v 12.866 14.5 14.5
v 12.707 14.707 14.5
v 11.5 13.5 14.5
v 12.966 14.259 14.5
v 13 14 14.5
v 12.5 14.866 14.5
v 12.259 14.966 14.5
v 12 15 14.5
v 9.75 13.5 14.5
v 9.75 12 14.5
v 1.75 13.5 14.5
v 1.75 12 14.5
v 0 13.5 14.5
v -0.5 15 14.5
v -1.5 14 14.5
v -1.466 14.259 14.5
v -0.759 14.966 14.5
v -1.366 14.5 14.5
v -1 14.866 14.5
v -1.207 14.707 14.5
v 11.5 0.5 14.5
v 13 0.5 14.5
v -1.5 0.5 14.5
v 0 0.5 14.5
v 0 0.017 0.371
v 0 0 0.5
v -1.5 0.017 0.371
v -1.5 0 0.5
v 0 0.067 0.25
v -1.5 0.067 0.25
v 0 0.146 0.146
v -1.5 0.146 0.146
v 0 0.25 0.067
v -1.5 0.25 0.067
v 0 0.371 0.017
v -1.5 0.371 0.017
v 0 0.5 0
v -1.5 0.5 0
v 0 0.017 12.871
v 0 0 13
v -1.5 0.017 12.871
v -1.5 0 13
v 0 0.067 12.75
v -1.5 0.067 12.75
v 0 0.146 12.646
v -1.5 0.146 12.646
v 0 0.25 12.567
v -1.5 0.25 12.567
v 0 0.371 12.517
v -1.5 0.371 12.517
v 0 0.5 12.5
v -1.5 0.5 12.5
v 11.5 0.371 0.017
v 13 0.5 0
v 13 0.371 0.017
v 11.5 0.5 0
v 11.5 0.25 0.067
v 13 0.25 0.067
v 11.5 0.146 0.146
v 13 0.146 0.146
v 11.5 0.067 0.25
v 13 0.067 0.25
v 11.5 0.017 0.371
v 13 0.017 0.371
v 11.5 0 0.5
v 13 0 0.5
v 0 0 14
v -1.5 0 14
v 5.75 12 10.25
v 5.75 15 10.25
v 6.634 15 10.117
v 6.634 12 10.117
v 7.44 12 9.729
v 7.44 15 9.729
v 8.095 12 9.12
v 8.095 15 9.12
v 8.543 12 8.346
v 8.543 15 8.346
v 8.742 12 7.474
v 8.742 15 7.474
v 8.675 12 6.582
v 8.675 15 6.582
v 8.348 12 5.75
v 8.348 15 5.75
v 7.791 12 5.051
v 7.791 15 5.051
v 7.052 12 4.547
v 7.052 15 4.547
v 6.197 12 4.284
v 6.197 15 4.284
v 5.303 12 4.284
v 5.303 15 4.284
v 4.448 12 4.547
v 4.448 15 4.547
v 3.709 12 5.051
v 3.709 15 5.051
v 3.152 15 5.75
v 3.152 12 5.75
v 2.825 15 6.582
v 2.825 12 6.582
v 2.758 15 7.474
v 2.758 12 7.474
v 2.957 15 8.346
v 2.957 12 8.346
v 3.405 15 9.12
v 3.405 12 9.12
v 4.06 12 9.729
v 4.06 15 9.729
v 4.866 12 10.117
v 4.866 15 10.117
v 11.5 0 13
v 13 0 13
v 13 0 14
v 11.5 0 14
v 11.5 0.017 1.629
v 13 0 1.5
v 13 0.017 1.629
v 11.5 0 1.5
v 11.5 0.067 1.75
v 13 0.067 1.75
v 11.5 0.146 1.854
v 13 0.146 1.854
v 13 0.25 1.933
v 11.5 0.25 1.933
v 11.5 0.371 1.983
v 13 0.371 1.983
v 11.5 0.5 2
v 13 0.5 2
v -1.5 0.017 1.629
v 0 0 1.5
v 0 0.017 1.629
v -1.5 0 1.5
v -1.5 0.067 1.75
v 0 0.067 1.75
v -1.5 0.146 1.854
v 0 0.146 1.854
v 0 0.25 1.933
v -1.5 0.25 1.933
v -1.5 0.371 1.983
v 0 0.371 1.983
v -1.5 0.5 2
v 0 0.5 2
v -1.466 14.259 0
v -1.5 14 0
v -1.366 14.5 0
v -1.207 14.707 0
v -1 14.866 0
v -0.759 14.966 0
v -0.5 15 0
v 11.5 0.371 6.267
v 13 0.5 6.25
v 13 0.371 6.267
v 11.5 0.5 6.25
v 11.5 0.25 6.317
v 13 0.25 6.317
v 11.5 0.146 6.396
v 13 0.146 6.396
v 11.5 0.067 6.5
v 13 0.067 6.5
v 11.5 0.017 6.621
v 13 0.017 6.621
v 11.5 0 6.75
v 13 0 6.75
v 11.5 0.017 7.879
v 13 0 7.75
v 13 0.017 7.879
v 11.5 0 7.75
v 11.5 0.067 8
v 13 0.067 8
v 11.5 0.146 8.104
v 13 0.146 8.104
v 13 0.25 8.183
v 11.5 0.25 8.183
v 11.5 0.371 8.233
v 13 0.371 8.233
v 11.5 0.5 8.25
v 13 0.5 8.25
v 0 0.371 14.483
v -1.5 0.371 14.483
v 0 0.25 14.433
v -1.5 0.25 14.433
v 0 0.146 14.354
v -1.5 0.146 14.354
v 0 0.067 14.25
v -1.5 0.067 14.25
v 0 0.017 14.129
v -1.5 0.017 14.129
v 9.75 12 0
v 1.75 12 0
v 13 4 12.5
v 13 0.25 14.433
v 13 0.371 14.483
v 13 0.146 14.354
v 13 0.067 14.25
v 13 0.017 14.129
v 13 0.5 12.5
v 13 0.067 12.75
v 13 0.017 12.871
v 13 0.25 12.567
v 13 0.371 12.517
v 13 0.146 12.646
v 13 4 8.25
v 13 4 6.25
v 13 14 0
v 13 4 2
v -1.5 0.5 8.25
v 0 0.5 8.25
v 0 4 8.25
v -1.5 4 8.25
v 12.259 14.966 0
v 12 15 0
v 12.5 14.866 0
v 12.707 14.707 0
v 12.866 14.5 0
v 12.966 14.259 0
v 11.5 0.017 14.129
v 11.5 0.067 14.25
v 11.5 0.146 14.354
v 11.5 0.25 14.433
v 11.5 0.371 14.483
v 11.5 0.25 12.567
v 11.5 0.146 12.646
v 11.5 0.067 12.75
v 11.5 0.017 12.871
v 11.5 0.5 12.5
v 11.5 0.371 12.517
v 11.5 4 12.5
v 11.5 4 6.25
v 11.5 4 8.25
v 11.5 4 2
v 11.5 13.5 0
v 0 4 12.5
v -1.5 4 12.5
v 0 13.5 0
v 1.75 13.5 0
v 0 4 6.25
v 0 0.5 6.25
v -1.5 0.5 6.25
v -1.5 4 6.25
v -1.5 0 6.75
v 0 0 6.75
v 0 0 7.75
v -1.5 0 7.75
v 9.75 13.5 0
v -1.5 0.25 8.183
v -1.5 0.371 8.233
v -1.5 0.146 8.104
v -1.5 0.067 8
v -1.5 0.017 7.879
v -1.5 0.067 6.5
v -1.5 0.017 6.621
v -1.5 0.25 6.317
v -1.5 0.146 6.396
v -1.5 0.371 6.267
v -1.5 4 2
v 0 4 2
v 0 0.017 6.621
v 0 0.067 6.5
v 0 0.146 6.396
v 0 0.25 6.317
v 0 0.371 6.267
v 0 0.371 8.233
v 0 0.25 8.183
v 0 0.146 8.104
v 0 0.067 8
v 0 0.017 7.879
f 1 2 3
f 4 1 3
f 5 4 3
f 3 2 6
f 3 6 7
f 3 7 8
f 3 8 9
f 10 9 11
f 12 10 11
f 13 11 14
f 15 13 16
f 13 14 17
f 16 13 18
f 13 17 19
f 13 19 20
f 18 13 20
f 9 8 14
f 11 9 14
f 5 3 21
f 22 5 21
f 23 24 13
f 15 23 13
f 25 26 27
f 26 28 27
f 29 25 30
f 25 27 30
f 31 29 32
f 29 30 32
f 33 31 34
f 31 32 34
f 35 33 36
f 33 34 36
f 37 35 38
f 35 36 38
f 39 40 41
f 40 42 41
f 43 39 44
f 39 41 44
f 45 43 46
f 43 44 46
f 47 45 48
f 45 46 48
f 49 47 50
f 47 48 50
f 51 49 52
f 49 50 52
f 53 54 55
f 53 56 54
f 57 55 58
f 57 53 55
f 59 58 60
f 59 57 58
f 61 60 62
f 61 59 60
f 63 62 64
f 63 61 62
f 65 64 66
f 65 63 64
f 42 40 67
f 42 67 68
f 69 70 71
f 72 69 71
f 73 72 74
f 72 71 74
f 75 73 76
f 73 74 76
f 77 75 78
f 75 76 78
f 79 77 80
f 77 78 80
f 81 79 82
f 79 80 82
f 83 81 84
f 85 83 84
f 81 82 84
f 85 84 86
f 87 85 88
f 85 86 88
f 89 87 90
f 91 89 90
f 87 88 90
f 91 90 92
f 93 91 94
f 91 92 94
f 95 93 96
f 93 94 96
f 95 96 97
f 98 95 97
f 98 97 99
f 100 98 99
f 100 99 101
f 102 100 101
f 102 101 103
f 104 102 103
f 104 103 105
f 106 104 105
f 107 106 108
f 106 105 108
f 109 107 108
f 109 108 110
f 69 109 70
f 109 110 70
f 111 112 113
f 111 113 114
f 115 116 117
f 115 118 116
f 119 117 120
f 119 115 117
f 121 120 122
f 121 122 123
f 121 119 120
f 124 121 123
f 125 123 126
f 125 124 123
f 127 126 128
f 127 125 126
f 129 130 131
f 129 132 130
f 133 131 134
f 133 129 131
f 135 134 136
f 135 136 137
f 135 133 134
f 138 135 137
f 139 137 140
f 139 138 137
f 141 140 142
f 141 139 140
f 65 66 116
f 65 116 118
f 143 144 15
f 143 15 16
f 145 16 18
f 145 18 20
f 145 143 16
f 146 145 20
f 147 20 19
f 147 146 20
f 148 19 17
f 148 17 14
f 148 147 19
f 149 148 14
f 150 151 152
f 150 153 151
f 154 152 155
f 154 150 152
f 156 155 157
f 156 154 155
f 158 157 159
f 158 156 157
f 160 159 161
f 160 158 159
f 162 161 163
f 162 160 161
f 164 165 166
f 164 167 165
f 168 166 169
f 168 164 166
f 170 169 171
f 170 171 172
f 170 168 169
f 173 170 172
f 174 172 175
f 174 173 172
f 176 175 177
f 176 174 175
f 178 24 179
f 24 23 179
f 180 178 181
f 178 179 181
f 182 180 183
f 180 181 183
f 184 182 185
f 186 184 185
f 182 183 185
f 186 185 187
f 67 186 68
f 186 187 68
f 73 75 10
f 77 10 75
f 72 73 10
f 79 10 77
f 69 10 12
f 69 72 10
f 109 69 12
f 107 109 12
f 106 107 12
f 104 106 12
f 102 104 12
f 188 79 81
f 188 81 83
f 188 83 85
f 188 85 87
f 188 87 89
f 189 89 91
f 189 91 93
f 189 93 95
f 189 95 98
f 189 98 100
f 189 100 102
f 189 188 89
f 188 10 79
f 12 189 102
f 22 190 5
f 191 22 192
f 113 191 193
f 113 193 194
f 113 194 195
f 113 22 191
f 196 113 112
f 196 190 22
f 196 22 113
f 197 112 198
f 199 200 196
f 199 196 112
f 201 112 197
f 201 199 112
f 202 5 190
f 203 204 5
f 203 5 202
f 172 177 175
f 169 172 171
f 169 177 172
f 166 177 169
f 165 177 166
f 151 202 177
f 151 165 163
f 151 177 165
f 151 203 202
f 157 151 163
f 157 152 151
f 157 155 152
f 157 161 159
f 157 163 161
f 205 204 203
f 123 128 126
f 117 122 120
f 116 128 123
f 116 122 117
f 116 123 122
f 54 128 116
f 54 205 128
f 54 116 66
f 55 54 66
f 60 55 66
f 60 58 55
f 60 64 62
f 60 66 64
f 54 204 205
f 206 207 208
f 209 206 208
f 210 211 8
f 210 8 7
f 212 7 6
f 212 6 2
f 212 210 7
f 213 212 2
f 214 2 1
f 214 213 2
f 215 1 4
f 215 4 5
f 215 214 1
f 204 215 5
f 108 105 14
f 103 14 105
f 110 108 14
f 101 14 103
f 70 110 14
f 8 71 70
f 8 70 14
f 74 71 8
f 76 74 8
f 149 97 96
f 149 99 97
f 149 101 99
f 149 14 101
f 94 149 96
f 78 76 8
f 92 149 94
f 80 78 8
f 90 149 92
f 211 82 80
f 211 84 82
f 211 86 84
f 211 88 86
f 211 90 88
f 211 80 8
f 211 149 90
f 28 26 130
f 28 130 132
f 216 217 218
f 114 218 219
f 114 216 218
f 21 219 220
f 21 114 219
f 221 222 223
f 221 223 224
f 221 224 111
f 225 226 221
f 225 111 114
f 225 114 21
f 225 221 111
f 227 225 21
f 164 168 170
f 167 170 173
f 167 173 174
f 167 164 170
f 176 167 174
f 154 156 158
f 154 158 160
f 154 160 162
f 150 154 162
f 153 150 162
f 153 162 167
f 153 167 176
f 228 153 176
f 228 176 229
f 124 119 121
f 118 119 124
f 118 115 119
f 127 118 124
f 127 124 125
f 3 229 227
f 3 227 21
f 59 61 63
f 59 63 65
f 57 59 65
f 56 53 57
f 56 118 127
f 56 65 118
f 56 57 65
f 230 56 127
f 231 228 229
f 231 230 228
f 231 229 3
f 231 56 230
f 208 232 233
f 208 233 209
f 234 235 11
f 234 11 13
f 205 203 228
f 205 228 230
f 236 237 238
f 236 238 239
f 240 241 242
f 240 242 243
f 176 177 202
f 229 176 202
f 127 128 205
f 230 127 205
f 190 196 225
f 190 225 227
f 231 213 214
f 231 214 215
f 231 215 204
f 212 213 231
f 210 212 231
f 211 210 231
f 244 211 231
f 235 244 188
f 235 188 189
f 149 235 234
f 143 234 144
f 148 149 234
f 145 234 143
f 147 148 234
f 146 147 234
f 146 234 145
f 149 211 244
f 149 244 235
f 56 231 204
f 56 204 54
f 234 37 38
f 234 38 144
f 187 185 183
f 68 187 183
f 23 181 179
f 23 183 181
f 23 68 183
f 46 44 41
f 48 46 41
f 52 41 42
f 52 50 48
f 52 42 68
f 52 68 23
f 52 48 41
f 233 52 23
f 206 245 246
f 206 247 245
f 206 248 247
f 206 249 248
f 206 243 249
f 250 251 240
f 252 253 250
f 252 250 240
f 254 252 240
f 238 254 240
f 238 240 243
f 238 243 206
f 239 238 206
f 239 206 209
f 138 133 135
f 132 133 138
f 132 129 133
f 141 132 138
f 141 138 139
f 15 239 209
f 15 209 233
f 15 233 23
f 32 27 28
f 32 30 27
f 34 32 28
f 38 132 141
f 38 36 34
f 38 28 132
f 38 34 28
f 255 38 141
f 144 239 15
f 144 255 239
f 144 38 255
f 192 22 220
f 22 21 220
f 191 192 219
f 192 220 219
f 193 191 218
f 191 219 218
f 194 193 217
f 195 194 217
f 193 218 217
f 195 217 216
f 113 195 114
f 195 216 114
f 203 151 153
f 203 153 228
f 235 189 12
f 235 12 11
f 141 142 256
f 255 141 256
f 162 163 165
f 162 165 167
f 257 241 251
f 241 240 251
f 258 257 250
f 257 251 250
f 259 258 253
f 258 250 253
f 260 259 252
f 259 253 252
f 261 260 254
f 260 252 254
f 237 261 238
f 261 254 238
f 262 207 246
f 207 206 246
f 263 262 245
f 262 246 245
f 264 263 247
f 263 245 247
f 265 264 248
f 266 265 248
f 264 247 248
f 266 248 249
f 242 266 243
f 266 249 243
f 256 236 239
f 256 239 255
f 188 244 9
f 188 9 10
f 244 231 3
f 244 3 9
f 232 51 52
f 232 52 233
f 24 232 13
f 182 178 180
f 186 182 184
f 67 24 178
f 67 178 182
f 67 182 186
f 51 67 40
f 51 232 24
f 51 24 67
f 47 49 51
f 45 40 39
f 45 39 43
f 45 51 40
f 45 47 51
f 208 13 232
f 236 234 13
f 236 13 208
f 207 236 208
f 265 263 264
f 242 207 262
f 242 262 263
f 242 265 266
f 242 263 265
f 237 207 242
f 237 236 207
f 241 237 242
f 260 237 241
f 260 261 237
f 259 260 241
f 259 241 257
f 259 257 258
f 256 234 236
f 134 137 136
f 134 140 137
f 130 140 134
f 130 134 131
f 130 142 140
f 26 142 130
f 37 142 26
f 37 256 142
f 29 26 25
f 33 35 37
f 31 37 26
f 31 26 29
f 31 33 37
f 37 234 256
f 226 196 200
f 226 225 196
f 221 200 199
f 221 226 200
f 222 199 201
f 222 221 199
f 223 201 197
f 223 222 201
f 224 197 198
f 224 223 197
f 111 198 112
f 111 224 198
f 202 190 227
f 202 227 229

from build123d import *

# Parameters (mm, degrees)
BOSS_EXTRUDE1_DEPTH = 14.5
CUT_EXTRUDE1_REACH  = 27.407
SKETCH2_W           = 4.25
SKETCH2_H           = 4
FILLET1_R           = 0.5
SKETCH3_R           = 3
CUT_EXTRUDE2_DEPTH  = 3


with BuildPart() as part:
    # Sketch1 → Boss-Extrude1 (new body)
    with BuildSketch(Plane.XY):
        with BuildLine():
            Line((0, 0), (-1.5, 0))
            Line((-1.5, 0), (-1.5, 14))
            ThreePointArc((-1.5, 14), (-1.207106781, 14.707106781), (-0.5, 15))
            Line((-0.5, 15), (12, 15))
            ThreePointArc((12, 15), (12.707106781, 14.707106781), (13, 14))
            Line((13, 14), (13, 0))
            Line((13, 0), (11.5, 0))
            Line((11.5, 0), (11.5, 13.5))
            Line((11.5, 13.5), (9.75, 13.5))
            Line((9.75, 13.5), (9.75, 12))
            Line((9.75, 12), (1.75, 12))
            Line((1.75, 12), (1.75, 13.5))
            Line((1.75, 13.5), (0, 13.5))
            Line((0, 13.5), (0, 0))
        make_face()
    extrude(amount=BOSS_EXTRUDE1_DEPTH)

    # Cut-Extrude1: up to this face of the body (flat: up to its plane)
    cut_extrude1_end = Plane(part.part.faces().sort_by_distance((-1.5, 7, 7.25))[0])
    # Sketch2 → Cut-Extrude1 (cut, up to the picked face)
    with BuildSketch(Plane(origin=(13, 0, 0), x_dir=(0, 0, -1), z_dir=(1, 0, 0)), mode=Mode.PRIVATE) as cut_extrude1_sk1:
        with Locations((-10.375, 2)):
            Rectangle(SKETCH2_W, SKETCH2_H)
    cut_extrude1_tool1 = split(extrude(cut_extrude1_sk1.sketch, amount=-CUT_EXTRUDE1_REACH, mode=Mode.PRIVATE), bisect_by=cut_extrude1_end, keep=Keep.BOTH, mode=Mode.PRIVATE)
    # Sketch2 → Cut-Extrude1 (cut, up to the picked face)
    with BuildSketch(Plane(origin=(13, 0, 0), x_dir=(0, 0, -1), z_dir=(1, 0, 0)), mode=Mode.PRIVATE) as cut_extrude1_sk2:
        with Locations((-4.125, 2)):
            Rectangle(SKETCH2_W, SKETCH2_H)
    cut_extrude1_tool2 = split(extrude(cut_extrude1_sk2.sketch, amount=-CUT_EXTRUDE1_REACH, mode=Mode.PRIVATE), bisect_by=cut_extrude1_end, keep=Keep.BOTH, mode=Mode.PRIVATE)
    add(cut_extrude1_tool1.solids().sort_by(Axis((13, 2, 10.375), (-1, 0, 0)))[0], mode=Mode.SUBTRACT)
    add(cut_extrude1_tool2.solids().sort_by(Axis((13, 2, 4.125), (-1, 0, 0)))[0], mode=Mode.SUBTRACT)

    # Fillet1
    fillet1_edges = [part.edges().sort_by_distance(p)[0] for p in [
        (-0.75, 0, 0),
        (12.25, 0, 0),
        (12.25, 0, 14.5),
        (-0.75, 0, 14.5),
        (-0.75, 0, 8.25),
        (12.25, 0, 8.25),
        (-0.75, 0, 12.5),
        (12.25, 0, 12.5),
        (-0.75, 0, 2),
        (12.25, 0, 2),
        (-0.75, 0, 6.25),
        (12.25, 0, 6.25),
    ]]
    fillet(fillet1_edges, radius=FILLET1_R)

    # Sketch3 → Cut-Extrude2 (cut)
    with BuildSketch(Plane(origin=(0, 15, 0), x_dir=(1, 0, 0), z_dir=(0, 1, 0))):
        with Locations(Location((5.75, -7.25, 0), (0, 0, 270))):
            Circle(SKETCH3_R)
    extrude(amount=-CUT_EXTRUDE2_DEPTH, mode=Mode.SUBTRACT)


solid = part.part
